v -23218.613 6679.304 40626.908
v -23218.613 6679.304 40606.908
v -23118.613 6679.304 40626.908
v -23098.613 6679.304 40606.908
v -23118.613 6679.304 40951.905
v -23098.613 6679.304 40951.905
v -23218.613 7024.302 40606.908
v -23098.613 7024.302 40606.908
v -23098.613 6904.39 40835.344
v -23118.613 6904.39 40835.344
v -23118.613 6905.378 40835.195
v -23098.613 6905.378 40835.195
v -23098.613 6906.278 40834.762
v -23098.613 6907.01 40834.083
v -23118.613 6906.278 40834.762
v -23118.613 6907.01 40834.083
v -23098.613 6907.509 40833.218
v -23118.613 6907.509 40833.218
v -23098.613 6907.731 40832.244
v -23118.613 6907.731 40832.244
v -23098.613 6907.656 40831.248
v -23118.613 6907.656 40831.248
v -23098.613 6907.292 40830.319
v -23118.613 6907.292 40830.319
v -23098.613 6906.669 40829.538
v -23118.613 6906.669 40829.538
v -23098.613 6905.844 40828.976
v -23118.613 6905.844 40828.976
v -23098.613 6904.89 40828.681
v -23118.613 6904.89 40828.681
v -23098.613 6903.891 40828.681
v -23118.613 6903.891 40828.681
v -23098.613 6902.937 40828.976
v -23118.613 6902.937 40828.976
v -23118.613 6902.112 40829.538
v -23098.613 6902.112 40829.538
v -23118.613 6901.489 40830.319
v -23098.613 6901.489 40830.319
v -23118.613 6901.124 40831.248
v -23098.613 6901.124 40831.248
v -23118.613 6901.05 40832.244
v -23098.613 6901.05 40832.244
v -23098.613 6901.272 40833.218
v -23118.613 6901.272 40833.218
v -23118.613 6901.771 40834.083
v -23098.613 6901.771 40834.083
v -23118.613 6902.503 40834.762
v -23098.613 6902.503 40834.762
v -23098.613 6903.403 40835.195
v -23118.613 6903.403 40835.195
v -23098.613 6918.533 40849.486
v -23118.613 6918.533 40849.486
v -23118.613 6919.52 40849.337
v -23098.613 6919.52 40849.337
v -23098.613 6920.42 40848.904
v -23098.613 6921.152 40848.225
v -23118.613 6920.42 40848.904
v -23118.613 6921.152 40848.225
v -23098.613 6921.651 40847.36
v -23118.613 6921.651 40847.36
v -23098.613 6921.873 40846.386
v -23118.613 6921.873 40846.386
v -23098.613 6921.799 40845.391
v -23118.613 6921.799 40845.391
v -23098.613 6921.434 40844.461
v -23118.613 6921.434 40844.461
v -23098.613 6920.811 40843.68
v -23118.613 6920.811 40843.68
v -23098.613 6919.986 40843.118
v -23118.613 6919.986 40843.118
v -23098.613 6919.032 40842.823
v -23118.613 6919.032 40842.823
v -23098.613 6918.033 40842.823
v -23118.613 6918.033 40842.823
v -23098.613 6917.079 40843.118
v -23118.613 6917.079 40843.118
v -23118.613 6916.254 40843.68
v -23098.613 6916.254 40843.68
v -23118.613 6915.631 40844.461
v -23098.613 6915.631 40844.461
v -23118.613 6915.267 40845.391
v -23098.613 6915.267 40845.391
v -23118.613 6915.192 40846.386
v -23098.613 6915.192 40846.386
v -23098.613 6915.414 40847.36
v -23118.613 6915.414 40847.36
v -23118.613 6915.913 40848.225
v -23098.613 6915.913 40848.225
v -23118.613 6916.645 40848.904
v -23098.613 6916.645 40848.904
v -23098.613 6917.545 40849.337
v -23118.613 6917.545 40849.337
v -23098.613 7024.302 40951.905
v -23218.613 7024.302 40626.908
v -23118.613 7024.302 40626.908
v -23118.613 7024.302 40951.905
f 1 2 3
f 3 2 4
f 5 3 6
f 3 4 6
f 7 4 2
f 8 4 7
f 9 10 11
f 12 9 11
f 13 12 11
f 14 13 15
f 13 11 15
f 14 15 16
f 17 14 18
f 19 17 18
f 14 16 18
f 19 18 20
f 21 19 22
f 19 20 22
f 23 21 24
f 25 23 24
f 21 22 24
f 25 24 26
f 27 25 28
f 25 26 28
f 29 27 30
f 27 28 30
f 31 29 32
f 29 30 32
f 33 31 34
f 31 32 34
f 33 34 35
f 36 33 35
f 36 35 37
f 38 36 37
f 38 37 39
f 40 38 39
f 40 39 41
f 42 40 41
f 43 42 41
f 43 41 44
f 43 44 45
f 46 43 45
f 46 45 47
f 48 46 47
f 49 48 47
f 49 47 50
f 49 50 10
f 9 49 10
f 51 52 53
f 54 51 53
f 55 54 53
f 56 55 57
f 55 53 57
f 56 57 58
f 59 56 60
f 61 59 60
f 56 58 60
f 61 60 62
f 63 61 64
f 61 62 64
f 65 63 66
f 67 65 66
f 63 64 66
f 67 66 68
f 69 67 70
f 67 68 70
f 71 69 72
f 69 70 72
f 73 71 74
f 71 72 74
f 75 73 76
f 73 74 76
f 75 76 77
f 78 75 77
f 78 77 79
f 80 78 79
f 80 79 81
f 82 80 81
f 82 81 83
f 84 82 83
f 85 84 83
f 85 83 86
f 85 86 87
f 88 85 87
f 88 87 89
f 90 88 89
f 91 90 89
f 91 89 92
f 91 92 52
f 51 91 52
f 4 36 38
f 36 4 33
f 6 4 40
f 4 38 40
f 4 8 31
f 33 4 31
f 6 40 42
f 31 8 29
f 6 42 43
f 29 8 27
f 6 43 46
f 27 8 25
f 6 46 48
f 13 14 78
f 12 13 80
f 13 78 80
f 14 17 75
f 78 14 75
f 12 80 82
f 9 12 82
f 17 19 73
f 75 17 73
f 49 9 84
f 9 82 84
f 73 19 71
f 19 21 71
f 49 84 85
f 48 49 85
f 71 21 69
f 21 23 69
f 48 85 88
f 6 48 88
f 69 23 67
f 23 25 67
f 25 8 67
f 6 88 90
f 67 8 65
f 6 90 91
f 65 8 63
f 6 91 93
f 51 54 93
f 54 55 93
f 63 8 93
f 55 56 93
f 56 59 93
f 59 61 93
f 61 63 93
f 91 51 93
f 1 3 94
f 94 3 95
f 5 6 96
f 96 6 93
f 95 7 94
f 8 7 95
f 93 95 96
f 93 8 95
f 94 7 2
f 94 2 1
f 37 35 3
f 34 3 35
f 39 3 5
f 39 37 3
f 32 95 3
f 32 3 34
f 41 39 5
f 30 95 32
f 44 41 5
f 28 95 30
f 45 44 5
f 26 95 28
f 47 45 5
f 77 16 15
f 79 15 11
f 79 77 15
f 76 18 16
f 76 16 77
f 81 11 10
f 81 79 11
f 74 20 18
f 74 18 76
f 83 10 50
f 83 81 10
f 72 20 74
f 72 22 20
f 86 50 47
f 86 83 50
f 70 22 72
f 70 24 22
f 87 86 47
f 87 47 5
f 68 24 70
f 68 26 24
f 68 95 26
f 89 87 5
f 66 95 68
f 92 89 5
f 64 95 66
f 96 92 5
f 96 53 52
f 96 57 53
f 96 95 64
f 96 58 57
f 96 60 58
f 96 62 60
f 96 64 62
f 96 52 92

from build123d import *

# Parameters (mm, degrees)
SKETCH1_W           = 344.997499296
SKETCH1_H           = 344.997499295
BOSS_EXTRUDE1_DEPTH = 20
SKETCH2_R           = 3.349999998
CUT_EXTRUDE1_DEPTH  = 21
SKETCH3_W           = 20
SKETCH3_H           = 344.997499295
BOSS_EXTRUDE2_DEPTH = 100


with BuildPart() as part:
    # Sketch1 → Boss-Extrude1 (new body)
    with BuildSketch(Plane.ZY.offset(23098.612597115)):
        with Locations((40779.406254132, 6851.802826482)):
            Rectangle(SKETCH1_W, SKETCH1_H)
    extrude(amount=BOSS_EXTRUDE1_DEPTH)

    # Sketch2 → Cut-Extrude1 (cut, through all)
    with BuildSketch(Plane.ZY.offset(23118.612597115)):
        with Locations((40846.136031778, 6918.532604128)):
            Circle(SKETCH2_R)
        with Locations((40831.993896154, 6904.390468504)):
            Circle(SKETCH2_R)
    extrude(amount=-CUT_EXTRUDE1_DEPTH, mode=Mode.SUBTRACT)

    # Sketch3 → Boss-Extrude2 (add)
    with BuildSketch(Plane.ZY.offset(23118.612597115)):
        with Locations((40616.907504484, 6851.802826482)):
            Rectangle(SKETCH3_W, SKETCH3_H)
    extrude(amount=BOSS_EXTRUDE2_DEPTH)


solid = part.part
